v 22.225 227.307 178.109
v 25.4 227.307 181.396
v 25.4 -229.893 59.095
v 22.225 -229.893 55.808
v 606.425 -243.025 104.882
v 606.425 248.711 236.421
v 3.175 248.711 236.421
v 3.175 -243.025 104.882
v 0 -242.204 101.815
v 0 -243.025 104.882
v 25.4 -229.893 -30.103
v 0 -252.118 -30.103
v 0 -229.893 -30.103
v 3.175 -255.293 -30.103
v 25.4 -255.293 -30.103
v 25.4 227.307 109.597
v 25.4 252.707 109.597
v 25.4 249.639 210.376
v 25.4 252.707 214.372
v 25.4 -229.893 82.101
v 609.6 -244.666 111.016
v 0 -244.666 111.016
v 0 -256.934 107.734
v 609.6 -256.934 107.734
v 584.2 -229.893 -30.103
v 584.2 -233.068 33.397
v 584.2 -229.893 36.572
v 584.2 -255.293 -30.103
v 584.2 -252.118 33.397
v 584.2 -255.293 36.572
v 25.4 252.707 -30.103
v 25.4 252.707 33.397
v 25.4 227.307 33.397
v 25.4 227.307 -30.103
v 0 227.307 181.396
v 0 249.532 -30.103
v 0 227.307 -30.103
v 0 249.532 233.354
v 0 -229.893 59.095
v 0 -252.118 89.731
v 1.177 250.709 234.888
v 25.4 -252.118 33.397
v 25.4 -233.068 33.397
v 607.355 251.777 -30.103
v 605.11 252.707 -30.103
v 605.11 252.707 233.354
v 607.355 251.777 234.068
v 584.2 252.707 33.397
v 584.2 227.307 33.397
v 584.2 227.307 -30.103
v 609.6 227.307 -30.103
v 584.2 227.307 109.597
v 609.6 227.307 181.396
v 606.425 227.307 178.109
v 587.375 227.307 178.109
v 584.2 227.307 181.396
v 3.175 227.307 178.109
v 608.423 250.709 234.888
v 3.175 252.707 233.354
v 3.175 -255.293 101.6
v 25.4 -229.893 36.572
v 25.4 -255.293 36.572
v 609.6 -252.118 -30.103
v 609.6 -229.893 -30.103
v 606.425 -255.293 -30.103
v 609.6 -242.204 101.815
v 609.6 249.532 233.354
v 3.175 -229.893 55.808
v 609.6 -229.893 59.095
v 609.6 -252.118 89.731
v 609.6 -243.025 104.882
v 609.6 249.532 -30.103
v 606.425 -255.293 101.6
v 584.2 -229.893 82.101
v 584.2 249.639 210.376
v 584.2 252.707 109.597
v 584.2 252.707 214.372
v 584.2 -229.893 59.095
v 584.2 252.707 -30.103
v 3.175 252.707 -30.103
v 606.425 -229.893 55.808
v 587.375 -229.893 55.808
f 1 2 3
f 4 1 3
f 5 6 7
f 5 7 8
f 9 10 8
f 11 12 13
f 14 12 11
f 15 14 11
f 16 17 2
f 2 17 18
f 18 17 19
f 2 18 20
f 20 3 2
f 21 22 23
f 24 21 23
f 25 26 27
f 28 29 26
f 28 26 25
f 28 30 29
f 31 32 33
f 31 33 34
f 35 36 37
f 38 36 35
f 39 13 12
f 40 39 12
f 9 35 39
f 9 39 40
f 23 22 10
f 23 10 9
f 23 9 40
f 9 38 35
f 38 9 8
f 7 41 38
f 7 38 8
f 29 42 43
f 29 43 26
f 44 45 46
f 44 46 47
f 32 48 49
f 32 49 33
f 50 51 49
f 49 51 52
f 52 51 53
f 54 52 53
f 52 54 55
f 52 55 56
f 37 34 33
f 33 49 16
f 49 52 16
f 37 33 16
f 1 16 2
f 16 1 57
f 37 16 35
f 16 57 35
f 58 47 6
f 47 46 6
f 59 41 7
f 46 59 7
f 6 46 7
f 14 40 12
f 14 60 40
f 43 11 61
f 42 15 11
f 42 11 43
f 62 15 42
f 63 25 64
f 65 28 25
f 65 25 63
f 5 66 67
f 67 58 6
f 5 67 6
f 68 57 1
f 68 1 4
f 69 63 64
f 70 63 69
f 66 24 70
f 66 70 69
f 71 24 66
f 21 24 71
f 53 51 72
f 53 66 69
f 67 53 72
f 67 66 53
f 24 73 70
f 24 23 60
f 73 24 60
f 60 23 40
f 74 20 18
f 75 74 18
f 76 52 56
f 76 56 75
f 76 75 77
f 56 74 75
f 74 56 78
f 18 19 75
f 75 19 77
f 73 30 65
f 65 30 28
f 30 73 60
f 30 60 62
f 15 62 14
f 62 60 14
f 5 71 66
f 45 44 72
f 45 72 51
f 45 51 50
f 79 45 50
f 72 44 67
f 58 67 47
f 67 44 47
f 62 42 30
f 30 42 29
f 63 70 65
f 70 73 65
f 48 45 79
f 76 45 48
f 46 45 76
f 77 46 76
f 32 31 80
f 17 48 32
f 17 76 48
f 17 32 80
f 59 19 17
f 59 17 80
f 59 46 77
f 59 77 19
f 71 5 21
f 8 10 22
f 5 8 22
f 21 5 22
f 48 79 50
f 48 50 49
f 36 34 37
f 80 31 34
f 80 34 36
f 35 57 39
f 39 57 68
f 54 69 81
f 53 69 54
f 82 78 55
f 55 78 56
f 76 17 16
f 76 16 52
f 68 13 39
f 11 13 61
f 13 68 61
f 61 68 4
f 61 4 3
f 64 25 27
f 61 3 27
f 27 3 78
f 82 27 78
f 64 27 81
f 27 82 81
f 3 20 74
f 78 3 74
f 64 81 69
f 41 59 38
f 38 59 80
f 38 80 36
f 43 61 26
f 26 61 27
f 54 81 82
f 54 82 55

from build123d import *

# Parameters (mm, degrees)
F1_DEPTH     = 609.6
F3_DEPTH     = 25.4
F5_DEPTH     = 25.4
F7_DEPTH     = 25.4
F9_DEPTH     = 25.4
F10_T1_DEPTH = 521.3263794739
F10_T3_DEPTH = 630.6724176283
F11_SIZE     = 3.175
F12_T1_DEPTH = 279.7873057355
F12_T3_DEPTH = 270.6235437243
F13_SIZE     = 3.175
F14_SIZE     = 3.175


# Not quite as in the source:
# - a fillet or chamfer that OpenCascade refuses, or shapes differently, is made with other operations: its cross-section is extruded or revolved along the edge and cut away or added


with BuildPart() as f1:
    # F0 (on Right) → F1 (new body)
    with BuildSketch(Plane.YZ):
        Polygon((252.7066397959, 237.49), (-243.0247255434, 104.8818597717), (-244.6656554292, 111.0161771021), (-256.93429009, 107.7343173304), (-255.2933602041, 101.6), (-255.2933602041, 75.3069357006), (252.7066397959, 211.1969357006), align=None)
    extrude(amount=F1_DEPTH)

    # F2 (on face) → F3 (join)
    with BuildSketch(Plane(origin=(0, 252.7066397959, 0), x_dir=(-1, 0, 0), z_dir=(0, 1, 0))):
        Polygon((-609.6, 211.1969357006), (-609.6, -30.1030642994), (-584.2, -30.1030642994), (-584.2, 33.3969357006), (-25.4, 33.3969357006), (-25.4, -30.1030642994), (0, -30.1030642994), (0, 211.1969357006), (-25.4, 211.1969357006), (-25.4, 109.5969357006), (-584.2, 109.5969357006), (-584.2, 211.1969357006), align=None)
    extrude(amount=-F3_DEPTH)

    # F4 (on face) → F5 (join)
    with BuildSketch(Plane.XZ.offset(255.2933602041)):
        Polygon((25.4, 101.6), (0, 101.6), (0, -30.1030642994), (25.4, -30.1030642994), (25.4, 33.3969357006), (584.2, 33.3969357006), (584.2, -30.1030642994), (609.6, -30.1030642994), (609.6, 101.6), (584.2, 101.6), (584.2, 84.1969357006), (25.4, 84.1969357006), align=None)
    extrude(amount=-F5_DEPTH)

    # F6 (on face) → F7 (join)
    with BuildSketch(Plane(origin=(0, 0, 0), x_dir=(0, -1, 0), z_dir=(-1, 0, 0))):
        Polygon((229.8933602041, 82.1014357006), (-227.3066397959, 204.4024357006), (-227.3066397959, 178.1093714013), (229.8933602041, 55.8083714013), align=None)
    extrude(amount=-F7_DEPTH)

    # F8 (on face) → F9 (join)
    with BuildSketch(Plane.YZ.offset(609.6)):
        Polygon((227.3066397959, 204.4024357006), (-229.8933602041, 82.1014357006), (-229.8933602041, 55.8083714013), (227.3066397959, 178.1093714013), align=None)
    extrude(amount=-F9_DEPTH)

    # F10: chamfer of 3.175 on 3 edges, made by hand

    # F10_s2 → F10_t1 (cut)
    with BuildSketch(Plane(origin=(0, 303.005458711, 81.0539602052), x_dir=(1, 0, 0), z_dir=(0, -0.9660342253, -0.2584141553))):
        Polygon((0, 160.9454953054), (3.175, 164.1204953054), (0, 164.1204953054), align=None)
        Polygon((609.6, 160.9454953054), (606.425, 164.1204953054), (609.6, 164.1204953054), align=None)
    extrude(amount=F10_T1_DEPTH, mode=Mode.SUBTRACT)

    # F10_s4 → F10_t3 (cut)
    with BuildSketch(Plane.YZ.offset(-10.5362088142)):
        Polygon((252.7066397959, 233.3540544626), (248.711174853, 236.4212131278), (252.7066397959, 237.49), align=None)
    extrude(amount=F10_T3_DEPTH, mode=Mode.SUBTRACT)

    # F11
    f11_edges = [f1.edges().sort_by_distance(p)[0] for p in [
        (609.6, -1.29336, 116.958871),
        (584.2, -1.29336, 116.958871),
        (25.4, -1.29336, 116.958871),
        (0, -1.29336, 116.958871),
        (609.6, -255.29336, 35.748468),
        (609.6, 252.70664, 101.625495),
        (0, -255.29336, 35.748468),
    ]]
    chamfer(f11_edges, length=F11_SIZE)

    # F12: chamfer of 3.175 on 2 edges, made by hand

    # F12_s2 → F12_t1 (cut)
    with BuildSketch(Plane.XY.offset(-38.2681577861)):
        Polygon((3.175, 252.7066397959), (0, 249.5316397959), (0, 252.7066397959), align=None)
    extrude(amount=F12_T1_DEPTH, mode=Mode.SUBTRACT)

    # F12_s4 → F12_t3 (cut)
    with BuildSketch(Plane.XY.offset(-33.6862767805)):
        Polygon((605.1098719395, 252.7066397959), (607.3549359697, 251.7767038262), (606.425, 252.7066397959), align=None)
    extrude(amount=F12_T3_DEPTH, mode=Mode.SUBTRACT)

    # F13
    f13_edges = [f1.edges().sort_by_distance(p)[0] for p in [
        (304.8, 252.70664, 211.196936),
    ]]
    chamfer(f13_edges, length=F13_SIZE)

    # F14
    f14_edges = [f1.edges().sort_by_distance(p)[0] for p in [
        (304.8, -255.29336, 33.396936),
        (304.8, -229.89336, 33.396936),
    ]]
    chamfer(f14_edges, length=F14_SIZE)


solid = f1.part
